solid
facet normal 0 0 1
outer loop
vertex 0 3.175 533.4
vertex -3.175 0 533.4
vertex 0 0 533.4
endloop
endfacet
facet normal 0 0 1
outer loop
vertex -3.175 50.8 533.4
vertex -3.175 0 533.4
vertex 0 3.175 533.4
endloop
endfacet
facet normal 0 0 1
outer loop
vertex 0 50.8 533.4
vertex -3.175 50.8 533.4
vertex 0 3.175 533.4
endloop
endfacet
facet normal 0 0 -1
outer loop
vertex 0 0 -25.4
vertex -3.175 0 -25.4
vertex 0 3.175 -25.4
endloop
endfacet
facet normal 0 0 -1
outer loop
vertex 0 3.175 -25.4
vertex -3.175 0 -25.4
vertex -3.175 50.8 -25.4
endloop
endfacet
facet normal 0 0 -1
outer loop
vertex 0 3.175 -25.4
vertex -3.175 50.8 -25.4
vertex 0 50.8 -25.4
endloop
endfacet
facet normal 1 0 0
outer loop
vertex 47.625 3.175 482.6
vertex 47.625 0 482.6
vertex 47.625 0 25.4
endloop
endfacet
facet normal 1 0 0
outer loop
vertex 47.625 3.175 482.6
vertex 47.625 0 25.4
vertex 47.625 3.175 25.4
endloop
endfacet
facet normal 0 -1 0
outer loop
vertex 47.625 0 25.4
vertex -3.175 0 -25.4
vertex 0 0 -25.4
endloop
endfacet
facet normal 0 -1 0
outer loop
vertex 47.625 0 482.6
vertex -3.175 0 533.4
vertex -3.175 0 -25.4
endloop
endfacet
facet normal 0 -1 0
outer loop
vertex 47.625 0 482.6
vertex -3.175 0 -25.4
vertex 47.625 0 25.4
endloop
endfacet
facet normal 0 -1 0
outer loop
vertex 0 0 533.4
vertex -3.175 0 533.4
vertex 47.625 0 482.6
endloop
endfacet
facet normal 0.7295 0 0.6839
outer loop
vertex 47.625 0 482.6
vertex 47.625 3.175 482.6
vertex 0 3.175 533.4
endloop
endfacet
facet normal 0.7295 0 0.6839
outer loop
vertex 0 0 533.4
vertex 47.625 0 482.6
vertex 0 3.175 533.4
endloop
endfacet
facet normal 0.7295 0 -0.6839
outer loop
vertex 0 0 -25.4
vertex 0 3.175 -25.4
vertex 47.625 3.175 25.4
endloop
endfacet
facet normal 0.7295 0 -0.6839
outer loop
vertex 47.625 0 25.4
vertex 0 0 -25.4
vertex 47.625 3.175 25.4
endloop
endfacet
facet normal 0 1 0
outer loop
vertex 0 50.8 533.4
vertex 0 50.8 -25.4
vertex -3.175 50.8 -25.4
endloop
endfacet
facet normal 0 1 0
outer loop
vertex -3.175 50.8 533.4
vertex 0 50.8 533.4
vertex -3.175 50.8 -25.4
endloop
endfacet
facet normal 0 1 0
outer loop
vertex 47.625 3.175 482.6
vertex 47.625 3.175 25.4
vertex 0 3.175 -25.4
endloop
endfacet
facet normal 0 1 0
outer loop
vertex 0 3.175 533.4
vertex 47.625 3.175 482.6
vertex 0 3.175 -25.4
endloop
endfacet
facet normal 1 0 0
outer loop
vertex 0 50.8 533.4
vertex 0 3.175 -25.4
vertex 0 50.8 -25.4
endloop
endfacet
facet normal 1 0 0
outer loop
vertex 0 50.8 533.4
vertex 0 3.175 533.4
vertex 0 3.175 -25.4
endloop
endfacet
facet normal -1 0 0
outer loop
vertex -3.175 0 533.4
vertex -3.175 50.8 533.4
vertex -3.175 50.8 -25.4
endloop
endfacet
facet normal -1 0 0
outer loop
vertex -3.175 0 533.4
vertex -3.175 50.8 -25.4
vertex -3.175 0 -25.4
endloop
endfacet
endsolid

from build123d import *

# Parameters (mm, degrees)
F1_DEPTH      = 533.4
F1_DEPTH_BACK = 25.4
F3_DEPTH      = 3.176


with BuildPart() as f1:
    # F0 (on Top) → F1 (new body, two sides)
    with BuildSketch(Plane.XY) as f1_sk:
        Polygon((0, 50.8), (-3.175, 50.8), (-3.175, 0), (47.625, 0), (47.625, 3.175), (0, 3.175), align=None)
    extrude(amount=F1_DEPTH)
    extrude(f1_sk.sketch, amount=-F1_DEPTH_BACK)

    # F2 (on face) → F3 (cut, through all)
    with BuildSketch(Plane(origin=(0, 3.175, 0), x_dir=(-1, 0, 0), z_dir=(0, 1, 0))):
        Polygon((-47.625, 533.4), (-47.625, 482.6), (0, 533.4), align=None)
        Polygon((0, -25.4), (-47.625, 25.4), (-47.625, -25.4), align=None)
    extrude(amount=-F3_DEPTH, mode=Mode.SUBTRACT)


solid = f1.part
